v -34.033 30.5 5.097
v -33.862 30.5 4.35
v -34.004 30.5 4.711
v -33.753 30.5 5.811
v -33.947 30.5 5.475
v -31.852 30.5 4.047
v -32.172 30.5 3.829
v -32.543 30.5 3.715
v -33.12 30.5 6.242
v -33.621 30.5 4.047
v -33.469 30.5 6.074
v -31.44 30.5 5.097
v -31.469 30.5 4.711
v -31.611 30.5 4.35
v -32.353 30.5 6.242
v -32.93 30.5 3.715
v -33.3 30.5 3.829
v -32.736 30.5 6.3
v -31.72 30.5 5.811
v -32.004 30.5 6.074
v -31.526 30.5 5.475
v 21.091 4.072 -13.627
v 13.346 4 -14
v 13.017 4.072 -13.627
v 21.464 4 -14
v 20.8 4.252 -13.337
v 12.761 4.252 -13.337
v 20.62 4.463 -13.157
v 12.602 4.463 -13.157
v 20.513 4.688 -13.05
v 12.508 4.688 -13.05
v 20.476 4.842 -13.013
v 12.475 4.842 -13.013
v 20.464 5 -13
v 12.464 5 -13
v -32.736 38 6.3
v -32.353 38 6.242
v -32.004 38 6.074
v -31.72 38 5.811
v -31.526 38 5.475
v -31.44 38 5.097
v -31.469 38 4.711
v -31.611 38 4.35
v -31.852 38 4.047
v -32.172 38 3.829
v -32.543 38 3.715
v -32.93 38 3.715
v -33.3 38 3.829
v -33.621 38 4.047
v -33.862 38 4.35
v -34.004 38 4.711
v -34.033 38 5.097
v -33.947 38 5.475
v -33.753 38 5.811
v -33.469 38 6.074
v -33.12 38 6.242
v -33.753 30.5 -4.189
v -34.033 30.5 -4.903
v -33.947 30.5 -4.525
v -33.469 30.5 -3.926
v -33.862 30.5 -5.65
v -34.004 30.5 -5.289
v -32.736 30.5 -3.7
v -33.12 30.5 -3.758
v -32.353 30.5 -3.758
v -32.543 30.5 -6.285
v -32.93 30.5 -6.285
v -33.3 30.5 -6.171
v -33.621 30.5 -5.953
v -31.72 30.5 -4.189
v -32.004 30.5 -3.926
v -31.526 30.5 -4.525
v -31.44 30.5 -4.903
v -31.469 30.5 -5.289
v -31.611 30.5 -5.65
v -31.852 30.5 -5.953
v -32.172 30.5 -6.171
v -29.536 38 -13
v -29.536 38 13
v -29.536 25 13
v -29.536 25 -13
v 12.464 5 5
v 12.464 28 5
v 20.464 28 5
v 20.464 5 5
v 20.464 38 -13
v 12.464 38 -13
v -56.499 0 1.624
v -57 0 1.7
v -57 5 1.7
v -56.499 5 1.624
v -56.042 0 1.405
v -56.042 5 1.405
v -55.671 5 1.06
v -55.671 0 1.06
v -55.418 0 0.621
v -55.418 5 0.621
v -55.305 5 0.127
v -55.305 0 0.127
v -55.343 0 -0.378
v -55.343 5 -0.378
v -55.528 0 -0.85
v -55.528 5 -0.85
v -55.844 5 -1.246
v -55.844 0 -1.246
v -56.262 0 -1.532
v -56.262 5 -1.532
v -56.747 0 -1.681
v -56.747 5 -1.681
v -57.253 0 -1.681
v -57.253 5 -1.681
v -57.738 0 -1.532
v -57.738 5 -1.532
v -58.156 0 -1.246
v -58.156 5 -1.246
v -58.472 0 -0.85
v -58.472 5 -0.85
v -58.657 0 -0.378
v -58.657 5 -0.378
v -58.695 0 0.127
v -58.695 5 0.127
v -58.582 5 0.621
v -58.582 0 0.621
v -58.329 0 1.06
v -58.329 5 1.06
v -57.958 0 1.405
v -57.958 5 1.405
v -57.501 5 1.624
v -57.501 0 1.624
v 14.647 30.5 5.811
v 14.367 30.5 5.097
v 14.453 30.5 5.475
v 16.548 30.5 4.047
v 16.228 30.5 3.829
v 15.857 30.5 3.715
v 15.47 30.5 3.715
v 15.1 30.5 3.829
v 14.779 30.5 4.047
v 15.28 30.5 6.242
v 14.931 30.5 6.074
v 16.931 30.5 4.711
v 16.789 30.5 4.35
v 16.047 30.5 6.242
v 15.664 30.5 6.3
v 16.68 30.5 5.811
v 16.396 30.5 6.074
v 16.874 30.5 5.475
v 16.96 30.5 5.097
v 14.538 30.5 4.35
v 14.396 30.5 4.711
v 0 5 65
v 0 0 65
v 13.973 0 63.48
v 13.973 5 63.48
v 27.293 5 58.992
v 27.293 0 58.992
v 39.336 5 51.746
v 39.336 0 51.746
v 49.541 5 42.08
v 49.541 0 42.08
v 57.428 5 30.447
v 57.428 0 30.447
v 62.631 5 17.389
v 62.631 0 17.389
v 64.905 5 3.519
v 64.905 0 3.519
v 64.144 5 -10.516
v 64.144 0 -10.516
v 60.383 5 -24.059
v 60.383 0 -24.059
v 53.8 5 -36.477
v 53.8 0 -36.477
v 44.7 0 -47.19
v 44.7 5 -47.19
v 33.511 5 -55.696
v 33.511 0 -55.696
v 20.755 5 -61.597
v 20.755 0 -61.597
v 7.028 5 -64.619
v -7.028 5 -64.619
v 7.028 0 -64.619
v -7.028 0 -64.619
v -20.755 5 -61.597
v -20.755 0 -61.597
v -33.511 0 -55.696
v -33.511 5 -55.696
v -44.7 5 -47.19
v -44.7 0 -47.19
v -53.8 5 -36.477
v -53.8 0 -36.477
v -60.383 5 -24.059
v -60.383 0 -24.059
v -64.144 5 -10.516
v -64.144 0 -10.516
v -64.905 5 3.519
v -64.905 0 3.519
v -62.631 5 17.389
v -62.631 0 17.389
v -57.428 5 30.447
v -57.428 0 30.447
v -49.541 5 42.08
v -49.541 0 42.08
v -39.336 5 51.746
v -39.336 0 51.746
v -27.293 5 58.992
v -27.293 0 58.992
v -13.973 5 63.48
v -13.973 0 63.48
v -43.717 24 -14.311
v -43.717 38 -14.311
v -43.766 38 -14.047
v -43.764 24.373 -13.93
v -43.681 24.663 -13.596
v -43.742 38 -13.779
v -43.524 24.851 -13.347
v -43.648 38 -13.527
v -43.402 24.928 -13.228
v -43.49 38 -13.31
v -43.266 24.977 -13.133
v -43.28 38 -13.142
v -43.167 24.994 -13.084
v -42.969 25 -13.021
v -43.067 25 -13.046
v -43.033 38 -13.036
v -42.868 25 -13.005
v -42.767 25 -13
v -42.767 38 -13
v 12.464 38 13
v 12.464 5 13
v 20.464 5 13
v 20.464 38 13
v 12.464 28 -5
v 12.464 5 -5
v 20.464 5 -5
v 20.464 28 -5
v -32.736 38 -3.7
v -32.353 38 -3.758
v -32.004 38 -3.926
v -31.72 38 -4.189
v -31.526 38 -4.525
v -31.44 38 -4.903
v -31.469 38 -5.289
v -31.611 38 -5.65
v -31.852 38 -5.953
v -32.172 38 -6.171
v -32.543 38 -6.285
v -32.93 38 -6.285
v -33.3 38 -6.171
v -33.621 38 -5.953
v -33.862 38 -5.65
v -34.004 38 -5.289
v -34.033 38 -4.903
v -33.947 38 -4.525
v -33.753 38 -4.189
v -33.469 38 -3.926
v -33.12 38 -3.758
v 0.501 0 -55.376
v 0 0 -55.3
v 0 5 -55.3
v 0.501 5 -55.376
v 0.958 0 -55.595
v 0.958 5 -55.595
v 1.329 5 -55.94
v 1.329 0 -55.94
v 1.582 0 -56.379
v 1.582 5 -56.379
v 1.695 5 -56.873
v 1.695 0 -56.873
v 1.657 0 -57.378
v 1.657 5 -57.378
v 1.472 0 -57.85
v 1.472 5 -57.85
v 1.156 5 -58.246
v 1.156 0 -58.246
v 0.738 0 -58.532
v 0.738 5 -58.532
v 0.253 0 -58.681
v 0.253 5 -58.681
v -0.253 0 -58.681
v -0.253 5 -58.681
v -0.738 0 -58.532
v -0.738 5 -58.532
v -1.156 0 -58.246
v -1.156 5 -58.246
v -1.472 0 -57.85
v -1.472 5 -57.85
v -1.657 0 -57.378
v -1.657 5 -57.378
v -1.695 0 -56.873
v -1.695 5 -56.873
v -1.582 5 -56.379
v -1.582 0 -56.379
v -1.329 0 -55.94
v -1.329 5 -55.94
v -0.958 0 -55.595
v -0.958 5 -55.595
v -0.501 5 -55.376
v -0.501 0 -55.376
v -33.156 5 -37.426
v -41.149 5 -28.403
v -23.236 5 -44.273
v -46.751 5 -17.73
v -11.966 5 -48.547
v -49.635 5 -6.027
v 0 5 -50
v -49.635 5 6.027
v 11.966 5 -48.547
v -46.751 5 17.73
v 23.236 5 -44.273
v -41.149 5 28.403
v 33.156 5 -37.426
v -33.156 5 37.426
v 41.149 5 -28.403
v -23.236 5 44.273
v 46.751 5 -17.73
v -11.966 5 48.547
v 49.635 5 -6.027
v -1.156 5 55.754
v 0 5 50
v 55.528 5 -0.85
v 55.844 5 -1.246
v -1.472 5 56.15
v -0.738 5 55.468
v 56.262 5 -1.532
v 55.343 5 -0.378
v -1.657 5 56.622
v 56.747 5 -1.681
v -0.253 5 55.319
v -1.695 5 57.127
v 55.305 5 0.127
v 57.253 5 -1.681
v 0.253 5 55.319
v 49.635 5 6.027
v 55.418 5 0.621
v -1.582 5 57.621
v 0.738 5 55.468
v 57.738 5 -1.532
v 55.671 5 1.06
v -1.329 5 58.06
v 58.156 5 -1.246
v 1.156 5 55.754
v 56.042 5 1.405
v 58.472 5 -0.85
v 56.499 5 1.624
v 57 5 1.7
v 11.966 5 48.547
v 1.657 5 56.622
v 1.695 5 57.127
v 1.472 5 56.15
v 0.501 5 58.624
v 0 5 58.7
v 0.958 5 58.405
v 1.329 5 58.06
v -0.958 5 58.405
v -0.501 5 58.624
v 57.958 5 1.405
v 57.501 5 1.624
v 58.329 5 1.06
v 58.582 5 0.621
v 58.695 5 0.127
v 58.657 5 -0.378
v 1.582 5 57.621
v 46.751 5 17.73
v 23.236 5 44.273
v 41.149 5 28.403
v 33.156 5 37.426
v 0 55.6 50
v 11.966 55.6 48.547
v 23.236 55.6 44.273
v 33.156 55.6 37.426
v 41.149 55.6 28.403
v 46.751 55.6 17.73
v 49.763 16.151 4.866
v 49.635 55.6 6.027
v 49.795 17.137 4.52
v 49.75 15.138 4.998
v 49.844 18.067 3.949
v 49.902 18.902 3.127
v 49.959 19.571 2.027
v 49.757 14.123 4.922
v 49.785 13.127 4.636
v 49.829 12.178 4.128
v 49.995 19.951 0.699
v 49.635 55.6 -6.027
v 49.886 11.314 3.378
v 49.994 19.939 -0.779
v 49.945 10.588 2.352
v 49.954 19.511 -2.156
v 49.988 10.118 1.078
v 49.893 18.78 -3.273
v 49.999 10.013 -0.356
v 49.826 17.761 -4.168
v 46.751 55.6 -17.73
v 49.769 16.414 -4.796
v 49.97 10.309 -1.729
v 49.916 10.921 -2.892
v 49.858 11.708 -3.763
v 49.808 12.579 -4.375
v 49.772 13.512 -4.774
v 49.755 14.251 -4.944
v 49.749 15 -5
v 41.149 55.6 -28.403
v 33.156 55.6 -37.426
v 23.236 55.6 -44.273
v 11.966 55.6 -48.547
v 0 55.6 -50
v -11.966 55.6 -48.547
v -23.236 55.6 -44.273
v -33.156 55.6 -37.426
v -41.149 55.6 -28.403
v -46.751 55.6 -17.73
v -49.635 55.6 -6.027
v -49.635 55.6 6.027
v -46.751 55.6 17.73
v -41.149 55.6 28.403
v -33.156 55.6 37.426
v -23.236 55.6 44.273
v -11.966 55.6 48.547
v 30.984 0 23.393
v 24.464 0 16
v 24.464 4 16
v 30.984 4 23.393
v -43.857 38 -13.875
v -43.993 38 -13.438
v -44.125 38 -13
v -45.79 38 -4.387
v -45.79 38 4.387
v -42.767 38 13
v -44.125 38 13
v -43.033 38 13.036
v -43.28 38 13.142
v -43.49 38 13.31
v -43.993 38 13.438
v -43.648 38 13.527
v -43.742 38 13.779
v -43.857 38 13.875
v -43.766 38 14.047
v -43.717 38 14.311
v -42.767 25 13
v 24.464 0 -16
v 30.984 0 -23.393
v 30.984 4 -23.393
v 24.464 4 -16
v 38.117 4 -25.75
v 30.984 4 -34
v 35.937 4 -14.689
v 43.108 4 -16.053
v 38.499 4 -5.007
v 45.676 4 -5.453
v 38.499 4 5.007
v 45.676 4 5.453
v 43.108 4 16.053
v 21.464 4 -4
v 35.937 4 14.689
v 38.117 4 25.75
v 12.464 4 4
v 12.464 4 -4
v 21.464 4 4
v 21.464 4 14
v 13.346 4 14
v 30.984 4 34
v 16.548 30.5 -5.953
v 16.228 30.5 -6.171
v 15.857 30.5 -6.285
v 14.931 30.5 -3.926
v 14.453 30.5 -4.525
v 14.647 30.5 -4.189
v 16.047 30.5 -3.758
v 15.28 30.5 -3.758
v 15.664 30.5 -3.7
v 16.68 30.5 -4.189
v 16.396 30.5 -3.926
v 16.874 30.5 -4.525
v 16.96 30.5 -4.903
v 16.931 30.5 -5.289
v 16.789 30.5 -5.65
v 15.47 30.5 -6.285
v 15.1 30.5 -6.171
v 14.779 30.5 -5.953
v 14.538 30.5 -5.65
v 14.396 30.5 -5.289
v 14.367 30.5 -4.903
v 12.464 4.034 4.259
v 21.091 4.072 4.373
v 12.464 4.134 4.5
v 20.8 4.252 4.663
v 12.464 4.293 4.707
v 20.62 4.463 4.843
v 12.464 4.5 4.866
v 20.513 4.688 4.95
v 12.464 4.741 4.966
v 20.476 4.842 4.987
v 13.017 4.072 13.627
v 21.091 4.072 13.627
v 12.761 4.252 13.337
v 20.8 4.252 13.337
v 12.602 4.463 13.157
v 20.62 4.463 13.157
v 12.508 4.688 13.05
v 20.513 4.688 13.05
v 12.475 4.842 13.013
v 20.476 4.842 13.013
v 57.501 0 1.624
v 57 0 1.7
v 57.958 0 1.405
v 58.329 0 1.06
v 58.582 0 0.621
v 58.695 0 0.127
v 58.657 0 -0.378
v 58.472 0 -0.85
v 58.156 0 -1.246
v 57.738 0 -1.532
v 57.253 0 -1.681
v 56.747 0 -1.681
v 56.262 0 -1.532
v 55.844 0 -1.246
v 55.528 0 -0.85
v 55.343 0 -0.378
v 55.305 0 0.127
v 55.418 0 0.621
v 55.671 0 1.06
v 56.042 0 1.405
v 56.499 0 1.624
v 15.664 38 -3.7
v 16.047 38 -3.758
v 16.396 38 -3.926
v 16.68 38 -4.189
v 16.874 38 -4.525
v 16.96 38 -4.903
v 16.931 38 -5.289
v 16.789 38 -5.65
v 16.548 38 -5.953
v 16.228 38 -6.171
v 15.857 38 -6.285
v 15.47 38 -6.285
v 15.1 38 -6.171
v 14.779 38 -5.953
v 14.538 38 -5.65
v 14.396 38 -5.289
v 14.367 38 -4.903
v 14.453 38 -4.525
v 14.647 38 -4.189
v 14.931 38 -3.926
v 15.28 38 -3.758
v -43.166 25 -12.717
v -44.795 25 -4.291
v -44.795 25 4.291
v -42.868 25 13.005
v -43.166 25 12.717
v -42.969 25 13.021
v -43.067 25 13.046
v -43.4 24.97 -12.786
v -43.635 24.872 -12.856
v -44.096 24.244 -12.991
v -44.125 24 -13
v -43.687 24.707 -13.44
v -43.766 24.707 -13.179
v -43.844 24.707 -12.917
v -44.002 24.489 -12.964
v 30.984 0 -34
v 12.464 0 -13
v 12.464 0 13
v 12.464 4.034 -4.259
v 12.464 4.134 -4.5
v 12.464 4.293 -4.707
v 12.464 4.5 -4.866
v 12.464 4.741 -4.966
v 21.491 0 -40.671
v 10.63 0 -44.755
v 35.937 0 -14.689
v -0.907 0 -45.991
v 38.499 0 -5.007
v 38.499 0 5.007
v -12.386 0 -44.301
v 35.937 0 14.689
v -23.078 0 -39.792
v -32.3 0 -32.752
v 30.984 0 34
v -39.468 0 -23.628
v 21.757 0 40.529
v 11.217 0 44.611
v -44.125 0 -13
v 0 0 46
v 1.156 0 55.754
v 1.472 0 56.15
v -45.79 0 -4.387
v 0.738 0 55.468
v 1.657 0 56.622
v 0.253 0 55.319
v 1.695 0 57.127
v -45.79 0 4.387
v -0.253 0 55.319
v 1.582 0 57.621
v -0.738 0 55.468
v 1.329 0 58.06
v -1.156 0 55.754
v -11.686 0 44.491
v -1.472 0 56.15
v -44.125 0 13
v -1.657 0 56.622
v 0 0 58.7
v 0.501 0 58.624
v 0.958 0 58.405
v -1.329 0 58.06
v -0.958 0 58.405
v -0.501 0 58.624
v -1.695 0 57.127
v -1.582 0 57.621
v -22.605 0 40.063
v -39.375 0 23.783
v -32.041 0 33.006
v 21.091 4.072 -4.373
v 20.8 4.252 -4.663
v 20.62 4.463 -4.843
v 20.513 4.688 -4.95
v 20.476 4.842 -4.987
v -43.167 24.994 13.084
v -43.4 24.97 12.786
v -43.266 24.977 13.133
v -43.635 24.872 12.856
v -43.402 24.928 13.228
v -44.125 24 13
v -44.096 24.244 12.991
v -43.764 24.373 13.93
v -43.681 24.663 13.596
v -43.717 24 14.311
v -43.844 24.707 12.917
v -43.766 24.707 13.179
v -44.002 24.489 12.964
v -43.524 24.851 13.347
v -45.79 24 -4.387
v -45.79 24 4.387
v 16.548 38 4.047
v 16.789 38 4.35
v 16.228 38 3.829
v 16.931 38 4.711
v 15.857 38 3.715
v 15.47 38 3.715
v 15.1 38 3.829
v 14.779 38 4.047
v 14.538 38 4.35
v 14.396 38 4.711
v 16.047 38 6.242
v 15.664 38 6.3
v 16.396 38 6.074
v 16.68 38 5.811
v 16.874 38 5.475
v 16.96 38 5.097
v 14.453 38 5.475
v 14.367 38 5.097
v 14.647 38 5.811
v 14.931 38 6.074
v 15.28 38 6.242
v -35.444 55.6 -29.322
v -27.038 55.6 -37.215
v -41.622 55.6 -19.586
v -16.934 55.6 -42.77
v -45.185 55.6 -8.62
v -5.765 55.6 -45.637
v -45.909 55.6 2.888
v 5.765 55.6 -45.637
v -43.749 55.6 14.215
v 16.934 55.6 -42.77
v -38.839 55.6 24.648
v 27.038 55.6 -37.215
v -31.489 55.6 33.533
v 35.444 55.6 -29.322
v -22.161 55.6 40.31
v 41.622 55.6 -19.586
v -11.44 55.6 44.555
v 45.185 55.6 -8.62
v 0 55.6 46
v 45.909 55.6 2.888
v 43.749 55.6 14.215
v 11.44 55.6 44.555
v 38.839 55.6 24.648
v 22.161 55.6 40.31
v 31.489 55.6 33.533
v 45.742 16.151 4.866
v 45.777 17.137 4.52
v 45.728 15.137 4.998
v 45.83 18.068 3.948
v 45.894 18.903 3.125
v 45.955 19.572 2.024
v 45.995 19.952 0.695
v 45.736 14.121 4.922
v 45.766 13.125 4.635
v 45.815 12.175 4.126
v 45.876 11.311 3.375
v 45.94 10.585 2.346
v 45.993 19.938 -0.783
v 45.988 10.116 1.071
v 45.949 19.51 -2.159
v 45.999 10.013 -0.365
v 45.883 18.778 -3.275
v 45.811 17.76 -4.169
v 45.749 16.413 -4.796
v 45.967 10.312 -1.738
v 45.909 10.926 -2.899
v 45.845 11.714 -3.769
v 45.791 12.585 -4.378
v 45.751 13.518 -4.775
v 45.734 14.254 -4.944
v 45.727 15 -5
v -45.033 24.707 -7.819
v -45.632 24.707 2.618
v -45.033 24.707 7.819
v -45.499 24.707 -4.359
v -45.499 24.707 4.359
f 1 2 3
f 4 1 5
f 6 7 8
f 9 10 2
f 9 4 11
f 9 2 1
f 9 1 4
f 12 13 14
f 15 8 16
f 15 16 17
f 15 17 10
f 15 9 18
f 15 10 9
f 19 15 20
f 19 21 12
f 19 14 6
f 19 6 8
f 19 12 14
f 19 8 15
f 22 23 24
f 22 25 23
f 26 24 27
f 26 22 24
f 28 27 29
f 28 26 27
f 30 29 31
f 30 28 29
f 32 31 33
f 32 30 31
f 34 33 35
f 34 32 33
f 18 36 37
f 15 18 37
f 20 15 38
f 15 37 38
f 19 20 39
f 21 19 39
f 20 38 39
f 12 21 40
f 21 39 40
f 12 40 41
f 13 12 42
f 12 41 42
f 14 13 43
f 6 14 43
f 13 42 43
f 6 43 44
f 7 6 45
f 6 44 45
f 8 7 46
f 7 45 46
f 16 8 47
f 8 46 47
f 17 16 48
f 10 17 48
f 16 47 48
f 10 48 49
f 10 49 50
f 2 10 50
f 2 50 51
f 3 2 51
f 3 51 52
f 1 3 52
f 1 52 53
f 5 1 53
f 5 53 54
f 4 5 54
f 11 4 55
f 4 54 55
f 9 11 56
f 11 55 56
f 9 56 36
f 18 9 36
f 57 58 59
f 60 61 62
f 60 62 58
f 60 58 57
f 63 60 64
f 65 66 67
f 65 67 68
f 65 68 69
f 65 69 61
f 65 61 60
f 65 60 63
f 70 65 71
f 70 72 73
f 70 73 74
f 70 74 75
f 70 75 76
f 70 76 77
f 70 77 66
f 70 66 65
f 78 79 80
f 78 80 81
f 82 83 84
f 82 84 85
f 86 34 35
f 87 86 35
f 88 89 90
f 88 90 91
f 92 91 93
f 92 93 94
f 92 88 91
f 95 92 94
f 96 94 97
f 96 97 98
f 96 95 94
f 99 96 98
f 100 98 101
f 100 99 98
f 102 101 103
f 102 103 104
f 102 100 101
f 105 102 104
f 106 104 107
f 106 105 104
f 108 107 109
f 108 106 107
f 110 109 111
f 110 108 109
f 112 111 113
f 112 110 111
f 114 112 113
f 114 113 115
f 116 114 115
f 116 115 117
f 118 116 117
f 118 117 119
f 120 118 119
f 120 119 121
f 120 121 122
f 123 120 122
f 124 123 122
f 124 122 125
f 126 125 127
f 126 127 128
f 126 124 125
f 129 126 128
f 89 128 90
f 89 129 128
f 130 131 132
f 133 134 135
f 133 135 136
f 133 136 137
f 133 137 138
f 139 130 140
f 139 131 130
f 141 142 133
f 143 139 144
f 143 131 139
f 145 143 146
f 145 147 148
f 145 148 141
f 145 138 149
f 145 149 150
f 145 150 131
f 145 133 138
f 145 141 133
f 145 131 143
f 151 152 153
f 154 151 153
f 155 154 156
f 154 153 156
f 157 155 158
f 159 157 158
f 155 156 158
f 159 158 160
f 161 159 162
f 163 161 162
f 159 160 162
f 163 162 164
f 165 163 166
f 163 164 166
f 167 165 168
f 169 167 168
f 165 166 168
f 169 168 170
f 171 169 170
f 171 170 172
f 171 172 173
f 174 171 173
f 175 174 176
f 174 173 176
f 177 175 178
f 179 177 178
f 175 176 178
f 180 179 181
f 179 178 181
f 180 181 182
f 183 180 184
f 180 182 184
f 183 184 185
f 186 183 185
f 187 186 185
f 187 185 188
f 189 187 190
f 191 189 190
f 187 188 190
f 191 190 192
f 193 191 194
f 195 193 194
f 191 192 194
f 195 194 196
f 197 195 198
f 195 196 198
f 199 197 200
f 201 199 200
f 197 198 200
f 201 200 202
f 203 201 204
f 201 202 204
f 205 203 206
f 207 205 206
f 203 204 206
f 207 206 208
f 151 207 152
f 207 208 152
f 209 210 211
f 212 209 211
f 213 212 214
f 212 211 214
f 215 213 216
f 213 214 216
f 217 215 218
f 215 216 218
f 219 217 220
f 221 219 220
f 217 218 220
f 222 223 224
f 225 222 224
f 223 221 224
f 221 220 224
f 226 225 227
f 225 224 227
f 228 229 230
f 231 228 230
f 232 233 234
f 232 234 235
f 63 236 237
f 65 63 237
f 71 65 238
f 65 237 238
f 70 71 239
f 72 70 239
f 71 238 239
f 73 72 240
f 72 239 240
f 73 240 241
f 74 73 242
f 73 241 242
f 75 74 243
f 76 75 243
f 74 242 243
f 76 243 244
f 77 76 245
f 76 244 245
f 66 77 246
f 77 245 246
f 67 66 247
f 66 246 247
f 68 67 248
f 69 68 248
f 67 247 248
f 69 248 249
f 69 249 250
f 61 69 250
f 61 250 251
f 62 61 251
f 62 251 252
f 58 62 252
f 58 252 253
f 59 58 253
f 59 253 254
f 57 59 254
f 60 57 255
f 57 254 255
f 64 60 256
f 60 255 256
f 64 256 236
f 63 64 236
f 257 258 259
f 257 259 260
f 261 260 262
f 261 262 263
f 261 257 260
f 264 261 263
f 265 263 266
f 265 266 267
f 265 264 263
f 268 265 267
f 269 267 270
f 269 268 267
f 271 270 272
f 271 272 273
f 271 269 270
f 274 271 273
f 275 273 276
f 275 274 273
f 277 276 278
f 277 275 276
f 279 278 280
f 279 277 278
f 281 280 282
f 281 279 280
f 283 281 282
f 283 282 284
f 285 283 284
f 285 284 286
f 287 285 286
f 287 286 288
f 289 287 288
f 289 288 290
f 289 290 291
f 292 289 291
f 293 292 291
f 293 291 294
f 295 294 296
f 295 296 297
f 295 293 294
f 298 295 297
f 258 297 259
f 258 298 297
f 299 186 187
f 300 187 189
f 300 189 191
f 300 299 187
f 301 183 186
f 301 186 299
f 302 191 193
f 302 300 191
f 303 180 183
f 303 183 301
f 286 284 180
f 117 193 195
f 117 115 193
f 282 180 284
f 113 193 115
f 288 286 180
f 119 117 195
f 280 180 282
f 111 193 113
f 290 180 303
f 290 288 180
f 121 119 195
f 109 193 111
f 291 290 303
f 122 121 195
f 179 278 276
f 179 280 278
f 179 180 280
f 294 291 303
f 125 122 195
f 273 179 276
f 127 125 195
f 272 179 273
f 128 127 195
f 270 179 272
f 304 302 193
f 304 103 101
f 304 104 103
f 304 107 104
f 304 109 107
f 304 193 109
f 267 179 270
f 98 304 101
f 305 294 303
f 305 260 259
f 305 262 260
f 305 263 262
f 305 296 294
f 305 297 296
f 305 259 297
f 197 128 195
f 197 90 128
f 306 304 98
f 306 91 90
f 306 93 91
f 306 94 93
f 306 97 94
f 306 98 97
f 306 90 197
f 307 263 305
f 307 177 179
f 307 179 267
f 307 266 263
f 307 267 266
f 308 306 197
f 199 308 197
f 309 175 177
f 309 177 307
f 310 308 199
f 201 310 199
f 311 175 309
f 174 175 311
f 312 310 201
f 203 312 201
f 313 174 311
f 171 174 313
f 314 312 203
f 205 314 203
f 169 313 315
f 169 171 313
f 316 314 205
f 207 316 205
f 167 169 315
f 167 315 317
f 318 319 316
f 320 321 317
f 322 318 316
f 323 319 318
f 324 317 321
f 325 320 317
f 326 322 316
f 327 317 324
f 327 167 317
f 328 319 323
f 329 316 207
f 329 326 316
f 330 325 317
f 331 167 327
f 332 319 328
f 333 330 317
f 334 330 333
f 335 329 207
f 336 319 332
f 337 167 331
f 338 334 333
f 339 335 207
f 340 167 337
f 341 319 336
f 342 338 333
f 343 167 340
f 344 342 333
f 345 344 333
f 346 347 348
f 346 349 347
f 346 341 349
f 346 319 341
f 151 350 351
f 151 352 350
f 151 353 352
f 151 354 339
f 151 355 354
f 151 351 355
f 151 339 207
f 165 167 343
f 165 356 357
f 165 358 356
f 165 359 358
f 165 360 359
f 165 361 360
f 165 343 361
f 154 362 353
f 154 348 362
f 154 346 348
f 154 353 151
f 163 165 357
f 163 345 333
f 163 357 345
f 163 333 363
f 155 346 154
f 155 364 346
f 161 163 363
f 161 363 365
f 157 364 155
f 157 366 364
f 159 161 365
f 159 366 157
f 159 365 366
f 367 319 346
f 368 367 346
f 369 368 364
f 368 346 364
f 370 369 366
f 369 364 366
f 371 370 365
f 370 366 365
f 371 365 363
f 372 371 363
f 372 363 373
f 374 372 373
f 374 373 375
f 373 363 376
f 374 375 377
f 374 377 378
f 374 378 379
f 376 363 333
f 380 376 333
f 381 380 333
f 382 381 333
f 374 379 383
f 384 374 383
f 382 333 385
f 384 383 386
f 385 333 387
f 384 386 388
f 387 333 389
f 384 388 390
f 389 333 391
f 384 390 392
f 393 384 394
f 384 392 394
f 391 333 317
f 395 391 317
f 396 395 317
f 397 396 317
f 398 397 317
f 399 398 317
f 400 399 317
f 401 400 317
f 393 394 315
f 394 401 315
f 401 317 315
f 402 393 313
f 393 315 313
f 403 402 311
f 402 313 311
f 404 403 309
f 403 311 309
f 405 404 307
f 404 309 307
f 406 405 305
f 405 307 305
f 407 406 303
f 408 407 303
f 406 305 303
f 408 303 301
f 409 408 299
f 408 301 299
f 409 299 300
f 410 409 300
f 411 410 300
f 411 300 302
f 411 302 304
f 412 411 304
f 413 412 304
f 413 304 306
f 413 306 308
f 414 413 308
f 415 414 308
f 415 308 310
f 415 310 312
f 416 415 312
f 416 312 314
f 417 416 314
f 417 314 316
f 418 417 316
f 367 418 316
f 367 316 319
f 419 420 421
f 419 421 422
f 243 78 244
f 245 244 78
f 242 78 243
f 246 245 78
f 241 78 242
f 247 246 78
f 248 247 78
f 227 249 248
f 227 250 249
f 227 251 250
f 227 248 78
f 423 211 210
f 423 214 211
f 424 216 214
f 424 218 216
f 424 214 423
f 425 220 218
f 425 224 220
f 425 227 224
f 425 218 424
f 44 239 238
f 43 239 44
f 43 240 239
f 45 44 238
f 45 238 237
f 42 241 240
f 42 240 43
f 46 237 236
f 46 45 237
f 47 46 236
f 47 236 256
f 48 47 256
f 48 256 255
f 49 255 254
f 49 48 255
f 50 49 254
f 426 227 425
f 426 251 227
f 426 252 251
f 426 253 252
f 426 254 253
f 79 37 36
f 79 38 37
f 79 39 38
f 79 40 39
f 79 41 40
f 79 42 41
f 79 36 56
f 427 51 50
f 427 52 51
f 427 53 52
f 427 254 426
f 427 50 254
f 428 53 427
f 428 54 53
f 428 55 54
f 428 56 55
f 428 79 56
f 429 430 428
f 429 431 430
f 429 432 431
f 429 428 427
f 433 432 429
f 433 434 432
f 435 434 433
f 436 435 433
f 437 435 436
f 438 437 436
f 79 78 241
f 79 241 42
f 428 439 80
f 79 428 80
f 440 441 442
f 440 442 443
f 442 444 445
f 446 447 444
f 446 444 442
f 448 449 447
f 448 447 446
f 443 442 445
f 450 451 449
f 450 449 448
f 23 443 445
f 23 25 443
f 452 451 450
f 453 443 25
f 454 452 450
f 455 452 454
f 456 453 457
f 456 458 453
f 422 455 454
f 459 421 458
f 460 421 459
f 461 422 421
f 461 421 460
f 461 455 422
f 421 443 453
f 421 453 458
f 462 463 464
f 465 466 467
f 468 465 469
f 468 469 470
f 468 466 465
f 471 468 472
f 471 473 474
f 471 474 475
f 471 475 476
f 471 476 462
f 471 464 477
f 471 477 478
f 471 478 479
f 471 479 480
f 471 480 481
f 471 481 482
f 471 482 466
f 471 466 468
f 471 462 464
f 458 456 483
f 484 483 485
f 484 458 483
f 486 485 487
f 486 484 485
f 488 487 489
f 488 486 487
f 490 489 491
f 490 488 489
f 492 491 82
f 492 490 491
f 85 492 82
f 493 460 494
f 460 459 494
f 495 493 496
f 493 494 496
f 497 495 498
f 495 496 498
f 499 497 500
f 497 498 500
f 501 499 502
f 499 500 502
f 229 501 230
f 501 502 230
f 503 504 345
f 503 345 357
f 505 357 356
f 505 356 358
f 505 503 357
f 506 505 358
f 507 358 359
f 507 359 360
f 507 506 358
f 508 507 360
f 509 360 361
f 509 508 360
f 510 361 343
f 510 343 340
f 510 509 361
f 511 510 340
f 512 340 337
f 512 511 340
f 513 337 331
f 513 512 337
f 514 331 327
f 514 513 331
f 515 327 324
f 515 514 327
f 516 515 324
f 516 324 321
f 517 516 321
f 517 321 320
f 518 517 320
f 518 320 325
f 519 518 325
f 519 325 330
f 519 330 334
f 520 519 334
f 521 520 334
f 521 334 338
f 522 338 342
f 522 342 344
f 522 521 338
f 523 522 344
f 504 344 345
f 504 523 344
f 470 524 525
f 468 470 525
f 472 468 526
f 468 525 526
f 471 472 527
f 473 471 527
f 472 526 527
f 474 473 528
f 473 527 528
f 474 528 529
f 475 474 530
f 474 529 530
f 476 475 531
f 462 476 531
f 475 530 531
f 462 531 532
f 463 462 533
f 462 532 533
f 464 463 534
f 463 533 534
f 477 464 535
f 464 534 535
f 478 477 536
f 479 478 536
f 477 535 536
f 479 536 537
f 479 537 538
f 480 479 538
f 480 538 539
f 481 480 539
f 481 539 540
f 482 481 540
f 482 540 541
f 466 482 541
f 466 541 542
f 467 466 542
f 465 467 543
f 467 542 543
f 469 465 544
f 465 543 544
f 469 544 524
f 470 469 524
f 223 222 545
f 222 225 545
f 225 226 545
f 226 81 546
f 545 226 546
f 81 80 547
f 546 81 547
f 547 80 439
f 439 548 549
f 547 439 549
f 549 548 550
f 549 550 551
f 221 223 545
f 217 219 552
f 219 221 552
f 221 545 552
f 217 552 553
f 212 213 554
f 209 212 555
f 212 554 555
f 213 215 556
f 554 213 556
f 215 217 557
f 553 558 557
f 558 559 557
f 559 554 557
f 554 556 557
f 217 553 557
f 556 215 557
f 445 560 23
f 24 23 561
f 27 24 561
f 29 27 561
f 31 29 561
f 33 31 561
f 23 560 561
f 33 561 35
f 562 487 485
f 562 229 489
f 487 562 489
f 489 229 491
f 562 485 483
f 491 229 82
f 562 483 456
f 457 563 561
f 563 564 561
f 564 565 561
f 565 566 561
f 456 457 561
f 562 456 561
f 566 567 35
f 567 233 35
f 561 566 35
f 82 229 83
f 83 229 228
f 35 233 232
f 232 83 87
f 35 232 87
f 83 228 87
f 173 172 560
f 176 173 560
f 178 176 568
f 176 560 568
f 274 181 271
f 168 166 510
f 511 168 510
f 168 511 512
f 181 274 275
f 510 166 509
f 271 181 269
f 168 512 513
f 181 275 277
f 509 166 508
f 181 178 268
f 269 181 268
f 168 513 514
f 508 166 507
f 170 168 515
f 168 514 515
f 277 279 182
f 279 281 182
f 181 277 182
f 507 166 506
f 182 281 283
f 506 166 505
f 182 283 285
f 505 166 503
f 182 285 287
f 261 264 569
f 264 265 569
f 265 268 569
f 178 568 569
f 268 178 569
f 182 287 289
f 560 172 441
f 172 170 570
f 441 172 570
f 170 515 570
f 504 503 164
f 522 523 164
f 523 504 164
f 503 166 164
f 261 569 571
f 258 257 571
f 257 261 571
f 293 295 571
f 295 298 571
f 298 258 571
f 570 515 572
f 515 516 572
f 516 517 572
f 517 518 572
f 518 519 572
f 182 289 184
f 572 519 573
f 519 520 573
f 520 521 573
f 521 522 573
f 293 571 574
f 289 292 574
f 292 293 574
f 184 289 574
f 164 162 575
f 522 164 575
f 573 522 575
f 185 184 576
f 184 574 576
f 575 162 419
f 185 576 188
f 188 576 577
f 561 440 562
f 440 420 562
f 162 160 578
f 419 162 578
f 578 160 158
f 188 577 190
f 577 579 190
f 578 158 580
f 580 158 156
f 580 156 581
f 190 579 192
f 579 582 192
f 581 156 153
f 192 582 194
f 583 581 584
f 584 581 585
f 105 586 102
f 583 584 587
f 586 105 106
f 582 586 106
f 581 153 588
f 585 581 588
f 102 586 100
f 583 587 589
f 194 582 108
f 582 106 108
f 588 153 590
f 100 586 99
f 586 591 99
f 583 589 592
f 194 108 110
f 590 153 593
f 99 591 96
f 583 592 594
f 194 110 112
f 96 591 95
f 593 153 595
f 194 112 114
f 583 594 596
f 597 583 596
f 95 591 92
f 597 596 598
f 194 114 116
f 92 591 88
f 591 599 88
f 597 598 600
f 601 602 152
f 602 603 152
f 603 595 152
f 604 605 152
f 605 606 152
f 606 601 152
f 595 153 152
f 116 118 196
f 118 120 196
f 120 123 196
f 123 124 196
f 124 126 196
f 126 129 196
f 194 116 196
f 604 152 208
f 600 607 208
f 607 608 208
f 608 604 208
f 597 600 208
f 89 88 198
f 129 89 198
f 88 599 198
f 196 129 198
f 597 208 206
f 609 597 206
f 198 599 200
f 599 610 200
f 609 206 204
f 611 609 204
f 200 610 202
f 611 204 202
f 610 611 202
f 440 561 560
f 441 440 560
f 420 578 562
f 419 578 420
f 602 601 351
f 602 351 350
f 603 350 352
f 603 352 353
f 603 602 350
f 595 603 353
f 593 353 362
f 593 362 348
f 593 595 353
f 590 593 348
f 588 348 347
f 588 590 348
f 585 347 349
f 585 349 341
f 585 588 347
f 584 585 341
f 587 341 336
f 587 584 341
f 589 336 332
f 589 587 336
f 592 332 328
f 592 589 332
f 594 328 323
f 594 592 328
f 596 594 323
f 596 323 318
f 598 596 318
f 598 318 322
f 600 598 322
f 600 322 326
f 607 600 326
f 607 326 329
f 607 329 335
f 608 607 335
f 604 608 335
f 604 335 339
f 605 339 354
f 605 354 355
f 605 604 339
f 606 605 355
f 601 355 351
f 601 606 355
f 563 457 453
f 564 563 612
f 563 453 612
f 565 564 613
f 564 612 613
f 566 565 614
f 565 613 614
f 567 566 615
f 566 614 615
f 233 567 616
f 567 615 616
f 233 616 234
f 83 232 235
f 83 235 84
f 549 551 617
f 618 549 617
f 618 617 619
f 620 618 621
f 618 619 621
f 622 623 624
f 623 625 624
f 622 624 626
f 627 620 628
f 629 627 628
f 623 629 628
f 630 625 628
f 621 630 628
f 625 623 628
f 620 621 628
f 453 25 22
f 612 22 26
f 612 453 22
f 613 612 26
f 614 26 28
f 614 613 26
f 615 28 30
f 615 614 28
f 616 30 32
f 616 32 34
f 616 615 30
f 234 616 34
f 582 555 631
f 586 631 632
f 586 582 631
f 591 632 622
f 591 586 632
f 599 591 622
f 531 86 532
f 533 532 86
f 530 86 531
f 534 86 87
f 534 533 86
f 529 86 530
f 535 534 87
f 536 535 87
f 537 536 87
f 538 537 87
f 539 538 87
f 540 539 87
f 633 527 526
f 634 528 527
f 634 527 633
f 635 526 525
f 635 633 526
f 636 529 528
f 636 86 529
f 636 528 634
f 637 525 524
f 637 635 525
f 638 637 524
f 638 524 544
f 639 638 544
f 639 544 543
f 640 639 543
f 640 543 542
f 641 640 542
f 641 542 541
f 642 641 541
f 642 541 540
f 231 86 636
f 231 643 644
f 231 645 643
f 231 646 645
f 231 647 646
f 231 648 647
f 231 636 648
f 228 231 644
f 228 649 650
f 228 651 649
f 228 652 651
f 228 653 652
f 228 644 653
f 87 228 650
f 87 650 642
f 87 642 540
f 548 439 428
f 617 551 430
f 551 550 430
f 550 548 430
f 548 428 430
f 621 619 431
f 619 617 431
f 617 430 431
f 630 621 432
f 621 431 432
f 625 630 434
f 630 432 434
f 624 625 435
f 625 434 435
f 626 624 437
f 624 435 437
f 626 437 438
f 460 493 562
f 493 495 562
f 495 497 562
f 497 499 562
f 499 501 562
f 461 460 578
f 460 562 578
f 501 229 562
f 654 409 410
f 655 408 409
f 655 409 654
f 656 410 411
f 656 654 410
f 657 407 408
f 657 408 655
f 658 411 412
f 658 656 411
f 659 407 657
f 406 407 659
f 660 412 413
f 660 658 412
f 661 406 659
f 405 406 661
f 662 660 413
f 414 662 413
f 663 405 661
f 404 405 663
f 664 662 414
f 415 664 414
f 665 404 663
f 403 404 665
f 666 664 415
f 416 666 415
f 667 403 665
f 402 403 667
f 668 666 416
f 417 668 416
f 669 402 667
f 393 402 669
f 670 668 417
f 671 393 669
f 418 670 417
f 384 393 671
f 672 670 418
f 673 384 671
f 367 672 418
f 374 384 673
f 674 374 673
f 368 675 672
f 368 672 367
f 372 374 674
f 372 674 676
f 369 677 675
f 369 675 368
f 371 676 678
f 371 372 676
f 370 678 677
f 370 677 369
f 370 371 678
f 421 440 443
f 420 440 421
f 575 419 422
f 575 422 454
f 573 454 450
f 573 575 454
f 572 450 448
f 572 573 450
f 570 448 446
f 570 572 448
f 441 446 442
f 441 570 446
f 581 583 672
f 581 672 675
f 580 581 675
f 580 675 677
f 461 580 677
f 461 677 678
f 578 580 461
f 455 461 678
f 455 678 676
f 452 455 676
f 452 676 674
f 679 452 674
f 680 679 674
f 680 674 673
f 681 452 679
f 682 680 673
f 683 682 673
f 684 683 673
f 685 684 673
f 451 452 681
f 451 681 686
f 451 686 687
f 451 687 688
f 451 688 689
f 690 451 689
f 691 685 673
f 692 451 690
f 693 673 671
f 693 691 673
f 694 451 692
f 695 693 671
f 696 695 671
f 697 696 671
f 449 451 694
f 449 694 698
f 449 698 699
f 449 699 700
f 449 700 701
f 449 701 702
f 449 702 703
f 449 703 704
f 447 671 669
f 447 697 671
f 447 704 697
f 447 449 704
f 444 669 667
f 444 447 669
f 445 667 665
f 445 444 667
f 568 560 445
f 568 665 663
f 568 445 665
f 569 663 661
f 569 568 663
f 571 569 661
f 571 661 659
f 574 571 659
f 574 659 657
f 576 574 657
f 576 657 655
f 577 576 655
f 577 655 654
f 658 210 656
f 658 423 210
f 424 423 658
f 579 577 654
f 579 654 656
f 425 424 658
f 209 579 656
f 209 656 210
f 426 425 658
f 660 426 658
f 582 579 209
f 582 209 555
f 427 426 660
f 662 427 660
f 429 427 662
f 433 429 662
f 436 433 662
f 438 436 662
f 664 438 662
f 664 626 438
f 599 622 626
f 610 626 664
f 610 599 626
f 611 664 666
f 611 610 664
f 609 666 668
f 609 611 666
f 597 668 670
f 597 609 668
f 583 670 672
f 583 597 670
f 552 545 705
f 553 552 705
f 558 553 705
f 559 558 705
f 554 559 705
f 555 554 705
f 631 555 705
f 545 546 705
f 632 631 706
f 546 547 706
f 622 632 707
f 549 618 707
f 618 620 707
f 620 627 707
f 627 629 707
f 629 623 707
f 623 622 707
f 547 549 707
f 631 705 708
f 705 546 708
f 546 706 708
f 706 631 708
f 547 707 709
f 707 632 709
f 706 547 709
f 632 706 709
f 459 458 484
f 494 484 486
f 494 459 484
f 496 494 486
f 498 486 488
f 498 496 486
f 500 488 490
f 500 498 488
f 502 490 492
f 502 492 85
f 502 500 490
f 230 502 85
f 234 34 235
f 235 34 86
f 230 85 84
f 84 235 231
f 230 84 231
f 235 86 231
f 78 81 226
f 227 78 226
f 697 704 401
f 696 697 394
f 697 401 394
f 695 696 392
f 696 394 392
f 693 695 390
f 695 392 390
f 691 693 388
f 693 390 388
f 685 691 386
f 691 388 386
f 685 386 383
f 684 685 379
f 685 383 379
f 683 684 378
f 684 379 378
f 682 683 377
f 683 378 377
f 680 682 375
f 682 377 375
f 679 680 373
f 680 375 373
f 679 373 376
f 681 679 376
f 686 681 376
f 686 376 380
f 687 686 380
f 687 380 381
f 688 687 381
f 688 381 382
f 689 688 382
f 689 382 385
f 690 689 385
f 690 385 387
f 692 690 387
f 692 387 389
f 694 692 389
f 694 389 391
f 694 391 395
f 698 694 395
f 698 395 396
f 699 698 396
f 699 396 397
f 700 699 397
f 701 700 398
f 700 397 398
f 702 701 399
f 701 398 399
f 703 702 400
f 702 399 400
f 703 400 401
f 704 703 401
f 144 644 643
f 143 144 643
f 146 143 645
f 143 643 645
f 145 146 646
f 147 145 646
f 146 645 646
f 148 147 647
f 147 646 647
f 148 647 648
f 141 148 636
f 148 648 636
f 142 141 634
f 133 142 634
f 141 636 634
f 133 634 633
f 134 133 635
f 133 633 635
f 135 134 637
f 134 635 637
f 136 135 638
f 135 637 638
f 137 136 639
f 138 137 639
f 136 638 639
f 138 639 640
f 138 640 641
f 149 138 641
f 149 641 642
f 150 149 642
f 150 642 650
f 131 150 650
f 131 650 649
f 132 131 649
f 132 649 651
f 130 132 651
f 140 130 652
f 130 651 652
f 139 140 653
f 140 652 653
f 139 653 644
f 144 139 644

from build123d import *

# Parameters (mm, degrees)
SKETCH1_R               = 65
SKETCH1_R_2             = 46
SKETCH1_R_3             = 1.7
BOSS_EXTRUDE1_DEPTH     = 5
SKETCH3_R               = 50
SKETCH3_R_2             = 46
BOSS_EXTRUDE2_DEPTH     = 50.6
BOSS_EXTRUDE3_DEPTH     = 4
BOSS_EXTRUDE4_DEPTH     = 8
BOSS_EXTRUDE5_DEPTH     = 38
CUT_EXTRUDE3_REACH      = 145.323
CUT_EXTRUDE3_END_RADIUS = 46
SKETCH12_R              = 5
SKETCH13_W              = 42
SKETCH13_H              = 26
CUT_EXTRUDE4_DEPTH      = 38
SKETCH14_R              = 1.3
CUT_EXTRUDE5_DEPTH      = 7.5
CUT_EXTRUDE6_DEPTH      = 25
FILLET1_R               = 1


with BuildPart() as part:
    # Sketch1 → Boss-Extrude1 (new body)
    with BuildSketch(Plane(origin=(0, 0, 0), x_dir=(1, 0, 0), z_dir=(0, 1, 0))):
        with Locations(Location((0, 0, 0), (0, 0, 270))):
            Circle(SKETCH1_R)
        with Locations(Location((0, 0, 0), (0, 0, 270))):
            Circle(SKETCH1_R_2, mode=Mode.SUBTRACT)
        with Locations(Location((0, -57, 0), (0, 0, 270))):
            Circle(SKETCH1_R_3, mode=Mode.SUBTRACT)
        with Locations(Location((-57, 0, 0), (0, 0, 270))):
            Circle(SKETCH1_R_3, mode=Mode.SUBTRACT)
        with Locations(Location((0, 57, 0), (0, 0, 270))):
            Circle(SKETCH1_R_3, mode=Mode.SUBTRACT)
        with Locations(Location((57, 0, 0), (0, 0, 270))):
            Circle(SKETCH1_R_3, mode=Mode.SUBTRACT)
    extrude(amount=BOSS_EXTRUDE1_DEPTH)

    # Sketch3 → Boss-Extrude2 (add)
    with BuildSketch(Plane(origin=(0, 5, 0), x_dir=(1, 0, 0), z_dir=(0, 1, 0))):
        with Locations(Location((0, 0, 0), (0, 0, 270))):
            Circle(SKETCH3_R)
        with Locations(Location((0, 0, 0), (0, 0, 270))):
            Circle(SKETCH3_R_2, mode=Mode.SUBTRACT)
    extrude(amount=BOSS_EXTRUDE2_DEPTH)

    # Sketch4 → Boss-Extrude3 (add)
    with BuildSketch(Plane.XZ):
        with BuildLine():
            Line((30.98386677, -34), (12.463607592, -13))
            Line((12.463607592, -13), (12.463607592, 13))
            Line((12.463607592, 13), (30.98386677, 34))
            ThreePointArc((30.98386677, 34), (46, 0), (30.98386677, -34))
        make_face()
        with BuildLine():
            Line((24.463607592, 16), (30.98386677, 23.393278972))
            ThreePointArc((30.98386677, 23.393278972), (38.823259794, 0), (30.98386677, -23.393278972))
            Line((30.98386677, -23.393278972), (24.463607592, -16))
            Line((24.463607592, -16), (24.463607592, 16))
        make_face(mode=Mode.SUBTRACT)
    extrude(amount=-BOSS_EXTRUDE3_DEPTH)

    # Sketch6 → Boss-Extrude4 (add)
    with BuildSketch(Plane.ZY.offset(-12.463607592)):
        Polygon((13, 4), (13, 38), (-13, 38), (-13, 4), (-5, 4), (-5, 28), (5, 28), (5, 4), align=None)
    extrude(amount=-BOSS_EXTRUDE4_DEPTH)

    # Sketch7 → Boss-Extrude5 (add)
    with BuildSketch(Plane.XZ):
        with BuildLine():
            Line((-44.124822946, 13), (12.463607592, 13))
            Line((12.463607592, 13), (12.463607592, -13))
            Line((12.463607592, -13), (-44.124822946, -13))
            ThreePointArc((-44.124822946, -13), (-46, 0), (-44.124822946, 13))
        make_face()
    extrude(amount=-BOSS_EXTRUDE5_DEPTH)

    # Cut-Extrude3: up to this cylinder (the profile starts outside it)
    cut_extrude3_end = Plane(origin=(0, 15, 0), z_dir=(0, -1, 0)) * Cylinder(CUT_EXTRUDE3_END_RADIUS, 383.646, mode=Mode.PRIVATE)
    # Sketch12 → Cut-Extrude3 (cut, up to the surface)
    with BuildSketch(Plane(origin=(50, 0, 0), x_dir=(0, 0, -1), z_dir=(1, 0, 0)), mode=Mode.PRIVATE) as cut_extrude3_sk1:
        with Locations((0, 15)):
            Circle(SKETCH12_R)
    cut_extrude3_tool1 = extrude(cut_extrude3_sk1.sketch, amount=-CUT_EXTRUDE3_REACH, mode=Mode.PRIVATE) - cut_extrude3_end
    add(cut_extrude3_tool1.solids().sort_by_distance((50, 15, 0))[0], mode=Mode.SUBTRACT)

    # Sketch13 → Cut-Extrude4 (cut)
    with BuildSketch(Plane(origin=(0, 38, 0), x_dir=(1, 0, 0), z_dir=(0, 1, 0))):
        with Locations((-8.536392408, 0)):
            Rectangle(SKETCH13_W, SKETCH13_H)
    extrude(amount=-CUT_EXTRUDE4_DEPTH, mode=Mode.SUBTRACT)

    # Sketch14 → Cut-Extrude5 (cut)
    with BuildSketch(Plane(origin=(0, 38, 0), x_dir=(1, 0, 0), z_dir=(0, 1, 0))):
        with Locations(Location((15.663607592, 5, 0), (0, 0, 270))):
            Circle(SKETCH14_R)
        with Locations(Location((15.663607592, -5, 0), (0, 0, 270))):
            Circle(SKETCH14_R)
        with Locations(Location((-32.736392408, 5, 0), (0, 0, 270))):
            Circle(SKETCH14_R)
        with Locations(Location((-32.736392408, -5, 0), (0, 0, 270))):
            Circle(SKETCH14_R)
    extrude(amount=-CUT_EXTRUDE5_DEPTH, mode=Mode.SUBTRACT)

    # Sketch15 → Cut-Extrude6 (cut)
    with BuildSketch(Plane.XZ):
        with BuildLine():
            Line((-44.124822946, 13), (-29.536392408, 13))
            Line((-29.536392408, 13), (-29.536392408, -13))
            Line((-29.536392408, -13), (-44.124822946, -13))
            ThreePointArc((-44.124822946, -13), (-46, 0), (-44.124822946, 13))
        make_face()
    extrude(amount=-CUT_EXTRUDE6_DEPTH, mode=Mode.SUBTRACT)

    # Fillet1
    fillet1_edges = [part.edges().sort_by_distance(p)[0] for p in [
        (-46, 25, 0),
        (20.463607592, 4, -9),
        (16.463607592, 4, -5),
        (16.463607592, 4, -13),
        (20.463607592, 4, 9),
        (16.463607592, 4, 13),
        (16.463607592, 4, 5),
        (-44.124822946, 31.5, 13),
        (-44.124822946, 31.5, -13),
    ]]
    fillet(fillet1_edges, radius=FILLET1_R)


solid = part.part
